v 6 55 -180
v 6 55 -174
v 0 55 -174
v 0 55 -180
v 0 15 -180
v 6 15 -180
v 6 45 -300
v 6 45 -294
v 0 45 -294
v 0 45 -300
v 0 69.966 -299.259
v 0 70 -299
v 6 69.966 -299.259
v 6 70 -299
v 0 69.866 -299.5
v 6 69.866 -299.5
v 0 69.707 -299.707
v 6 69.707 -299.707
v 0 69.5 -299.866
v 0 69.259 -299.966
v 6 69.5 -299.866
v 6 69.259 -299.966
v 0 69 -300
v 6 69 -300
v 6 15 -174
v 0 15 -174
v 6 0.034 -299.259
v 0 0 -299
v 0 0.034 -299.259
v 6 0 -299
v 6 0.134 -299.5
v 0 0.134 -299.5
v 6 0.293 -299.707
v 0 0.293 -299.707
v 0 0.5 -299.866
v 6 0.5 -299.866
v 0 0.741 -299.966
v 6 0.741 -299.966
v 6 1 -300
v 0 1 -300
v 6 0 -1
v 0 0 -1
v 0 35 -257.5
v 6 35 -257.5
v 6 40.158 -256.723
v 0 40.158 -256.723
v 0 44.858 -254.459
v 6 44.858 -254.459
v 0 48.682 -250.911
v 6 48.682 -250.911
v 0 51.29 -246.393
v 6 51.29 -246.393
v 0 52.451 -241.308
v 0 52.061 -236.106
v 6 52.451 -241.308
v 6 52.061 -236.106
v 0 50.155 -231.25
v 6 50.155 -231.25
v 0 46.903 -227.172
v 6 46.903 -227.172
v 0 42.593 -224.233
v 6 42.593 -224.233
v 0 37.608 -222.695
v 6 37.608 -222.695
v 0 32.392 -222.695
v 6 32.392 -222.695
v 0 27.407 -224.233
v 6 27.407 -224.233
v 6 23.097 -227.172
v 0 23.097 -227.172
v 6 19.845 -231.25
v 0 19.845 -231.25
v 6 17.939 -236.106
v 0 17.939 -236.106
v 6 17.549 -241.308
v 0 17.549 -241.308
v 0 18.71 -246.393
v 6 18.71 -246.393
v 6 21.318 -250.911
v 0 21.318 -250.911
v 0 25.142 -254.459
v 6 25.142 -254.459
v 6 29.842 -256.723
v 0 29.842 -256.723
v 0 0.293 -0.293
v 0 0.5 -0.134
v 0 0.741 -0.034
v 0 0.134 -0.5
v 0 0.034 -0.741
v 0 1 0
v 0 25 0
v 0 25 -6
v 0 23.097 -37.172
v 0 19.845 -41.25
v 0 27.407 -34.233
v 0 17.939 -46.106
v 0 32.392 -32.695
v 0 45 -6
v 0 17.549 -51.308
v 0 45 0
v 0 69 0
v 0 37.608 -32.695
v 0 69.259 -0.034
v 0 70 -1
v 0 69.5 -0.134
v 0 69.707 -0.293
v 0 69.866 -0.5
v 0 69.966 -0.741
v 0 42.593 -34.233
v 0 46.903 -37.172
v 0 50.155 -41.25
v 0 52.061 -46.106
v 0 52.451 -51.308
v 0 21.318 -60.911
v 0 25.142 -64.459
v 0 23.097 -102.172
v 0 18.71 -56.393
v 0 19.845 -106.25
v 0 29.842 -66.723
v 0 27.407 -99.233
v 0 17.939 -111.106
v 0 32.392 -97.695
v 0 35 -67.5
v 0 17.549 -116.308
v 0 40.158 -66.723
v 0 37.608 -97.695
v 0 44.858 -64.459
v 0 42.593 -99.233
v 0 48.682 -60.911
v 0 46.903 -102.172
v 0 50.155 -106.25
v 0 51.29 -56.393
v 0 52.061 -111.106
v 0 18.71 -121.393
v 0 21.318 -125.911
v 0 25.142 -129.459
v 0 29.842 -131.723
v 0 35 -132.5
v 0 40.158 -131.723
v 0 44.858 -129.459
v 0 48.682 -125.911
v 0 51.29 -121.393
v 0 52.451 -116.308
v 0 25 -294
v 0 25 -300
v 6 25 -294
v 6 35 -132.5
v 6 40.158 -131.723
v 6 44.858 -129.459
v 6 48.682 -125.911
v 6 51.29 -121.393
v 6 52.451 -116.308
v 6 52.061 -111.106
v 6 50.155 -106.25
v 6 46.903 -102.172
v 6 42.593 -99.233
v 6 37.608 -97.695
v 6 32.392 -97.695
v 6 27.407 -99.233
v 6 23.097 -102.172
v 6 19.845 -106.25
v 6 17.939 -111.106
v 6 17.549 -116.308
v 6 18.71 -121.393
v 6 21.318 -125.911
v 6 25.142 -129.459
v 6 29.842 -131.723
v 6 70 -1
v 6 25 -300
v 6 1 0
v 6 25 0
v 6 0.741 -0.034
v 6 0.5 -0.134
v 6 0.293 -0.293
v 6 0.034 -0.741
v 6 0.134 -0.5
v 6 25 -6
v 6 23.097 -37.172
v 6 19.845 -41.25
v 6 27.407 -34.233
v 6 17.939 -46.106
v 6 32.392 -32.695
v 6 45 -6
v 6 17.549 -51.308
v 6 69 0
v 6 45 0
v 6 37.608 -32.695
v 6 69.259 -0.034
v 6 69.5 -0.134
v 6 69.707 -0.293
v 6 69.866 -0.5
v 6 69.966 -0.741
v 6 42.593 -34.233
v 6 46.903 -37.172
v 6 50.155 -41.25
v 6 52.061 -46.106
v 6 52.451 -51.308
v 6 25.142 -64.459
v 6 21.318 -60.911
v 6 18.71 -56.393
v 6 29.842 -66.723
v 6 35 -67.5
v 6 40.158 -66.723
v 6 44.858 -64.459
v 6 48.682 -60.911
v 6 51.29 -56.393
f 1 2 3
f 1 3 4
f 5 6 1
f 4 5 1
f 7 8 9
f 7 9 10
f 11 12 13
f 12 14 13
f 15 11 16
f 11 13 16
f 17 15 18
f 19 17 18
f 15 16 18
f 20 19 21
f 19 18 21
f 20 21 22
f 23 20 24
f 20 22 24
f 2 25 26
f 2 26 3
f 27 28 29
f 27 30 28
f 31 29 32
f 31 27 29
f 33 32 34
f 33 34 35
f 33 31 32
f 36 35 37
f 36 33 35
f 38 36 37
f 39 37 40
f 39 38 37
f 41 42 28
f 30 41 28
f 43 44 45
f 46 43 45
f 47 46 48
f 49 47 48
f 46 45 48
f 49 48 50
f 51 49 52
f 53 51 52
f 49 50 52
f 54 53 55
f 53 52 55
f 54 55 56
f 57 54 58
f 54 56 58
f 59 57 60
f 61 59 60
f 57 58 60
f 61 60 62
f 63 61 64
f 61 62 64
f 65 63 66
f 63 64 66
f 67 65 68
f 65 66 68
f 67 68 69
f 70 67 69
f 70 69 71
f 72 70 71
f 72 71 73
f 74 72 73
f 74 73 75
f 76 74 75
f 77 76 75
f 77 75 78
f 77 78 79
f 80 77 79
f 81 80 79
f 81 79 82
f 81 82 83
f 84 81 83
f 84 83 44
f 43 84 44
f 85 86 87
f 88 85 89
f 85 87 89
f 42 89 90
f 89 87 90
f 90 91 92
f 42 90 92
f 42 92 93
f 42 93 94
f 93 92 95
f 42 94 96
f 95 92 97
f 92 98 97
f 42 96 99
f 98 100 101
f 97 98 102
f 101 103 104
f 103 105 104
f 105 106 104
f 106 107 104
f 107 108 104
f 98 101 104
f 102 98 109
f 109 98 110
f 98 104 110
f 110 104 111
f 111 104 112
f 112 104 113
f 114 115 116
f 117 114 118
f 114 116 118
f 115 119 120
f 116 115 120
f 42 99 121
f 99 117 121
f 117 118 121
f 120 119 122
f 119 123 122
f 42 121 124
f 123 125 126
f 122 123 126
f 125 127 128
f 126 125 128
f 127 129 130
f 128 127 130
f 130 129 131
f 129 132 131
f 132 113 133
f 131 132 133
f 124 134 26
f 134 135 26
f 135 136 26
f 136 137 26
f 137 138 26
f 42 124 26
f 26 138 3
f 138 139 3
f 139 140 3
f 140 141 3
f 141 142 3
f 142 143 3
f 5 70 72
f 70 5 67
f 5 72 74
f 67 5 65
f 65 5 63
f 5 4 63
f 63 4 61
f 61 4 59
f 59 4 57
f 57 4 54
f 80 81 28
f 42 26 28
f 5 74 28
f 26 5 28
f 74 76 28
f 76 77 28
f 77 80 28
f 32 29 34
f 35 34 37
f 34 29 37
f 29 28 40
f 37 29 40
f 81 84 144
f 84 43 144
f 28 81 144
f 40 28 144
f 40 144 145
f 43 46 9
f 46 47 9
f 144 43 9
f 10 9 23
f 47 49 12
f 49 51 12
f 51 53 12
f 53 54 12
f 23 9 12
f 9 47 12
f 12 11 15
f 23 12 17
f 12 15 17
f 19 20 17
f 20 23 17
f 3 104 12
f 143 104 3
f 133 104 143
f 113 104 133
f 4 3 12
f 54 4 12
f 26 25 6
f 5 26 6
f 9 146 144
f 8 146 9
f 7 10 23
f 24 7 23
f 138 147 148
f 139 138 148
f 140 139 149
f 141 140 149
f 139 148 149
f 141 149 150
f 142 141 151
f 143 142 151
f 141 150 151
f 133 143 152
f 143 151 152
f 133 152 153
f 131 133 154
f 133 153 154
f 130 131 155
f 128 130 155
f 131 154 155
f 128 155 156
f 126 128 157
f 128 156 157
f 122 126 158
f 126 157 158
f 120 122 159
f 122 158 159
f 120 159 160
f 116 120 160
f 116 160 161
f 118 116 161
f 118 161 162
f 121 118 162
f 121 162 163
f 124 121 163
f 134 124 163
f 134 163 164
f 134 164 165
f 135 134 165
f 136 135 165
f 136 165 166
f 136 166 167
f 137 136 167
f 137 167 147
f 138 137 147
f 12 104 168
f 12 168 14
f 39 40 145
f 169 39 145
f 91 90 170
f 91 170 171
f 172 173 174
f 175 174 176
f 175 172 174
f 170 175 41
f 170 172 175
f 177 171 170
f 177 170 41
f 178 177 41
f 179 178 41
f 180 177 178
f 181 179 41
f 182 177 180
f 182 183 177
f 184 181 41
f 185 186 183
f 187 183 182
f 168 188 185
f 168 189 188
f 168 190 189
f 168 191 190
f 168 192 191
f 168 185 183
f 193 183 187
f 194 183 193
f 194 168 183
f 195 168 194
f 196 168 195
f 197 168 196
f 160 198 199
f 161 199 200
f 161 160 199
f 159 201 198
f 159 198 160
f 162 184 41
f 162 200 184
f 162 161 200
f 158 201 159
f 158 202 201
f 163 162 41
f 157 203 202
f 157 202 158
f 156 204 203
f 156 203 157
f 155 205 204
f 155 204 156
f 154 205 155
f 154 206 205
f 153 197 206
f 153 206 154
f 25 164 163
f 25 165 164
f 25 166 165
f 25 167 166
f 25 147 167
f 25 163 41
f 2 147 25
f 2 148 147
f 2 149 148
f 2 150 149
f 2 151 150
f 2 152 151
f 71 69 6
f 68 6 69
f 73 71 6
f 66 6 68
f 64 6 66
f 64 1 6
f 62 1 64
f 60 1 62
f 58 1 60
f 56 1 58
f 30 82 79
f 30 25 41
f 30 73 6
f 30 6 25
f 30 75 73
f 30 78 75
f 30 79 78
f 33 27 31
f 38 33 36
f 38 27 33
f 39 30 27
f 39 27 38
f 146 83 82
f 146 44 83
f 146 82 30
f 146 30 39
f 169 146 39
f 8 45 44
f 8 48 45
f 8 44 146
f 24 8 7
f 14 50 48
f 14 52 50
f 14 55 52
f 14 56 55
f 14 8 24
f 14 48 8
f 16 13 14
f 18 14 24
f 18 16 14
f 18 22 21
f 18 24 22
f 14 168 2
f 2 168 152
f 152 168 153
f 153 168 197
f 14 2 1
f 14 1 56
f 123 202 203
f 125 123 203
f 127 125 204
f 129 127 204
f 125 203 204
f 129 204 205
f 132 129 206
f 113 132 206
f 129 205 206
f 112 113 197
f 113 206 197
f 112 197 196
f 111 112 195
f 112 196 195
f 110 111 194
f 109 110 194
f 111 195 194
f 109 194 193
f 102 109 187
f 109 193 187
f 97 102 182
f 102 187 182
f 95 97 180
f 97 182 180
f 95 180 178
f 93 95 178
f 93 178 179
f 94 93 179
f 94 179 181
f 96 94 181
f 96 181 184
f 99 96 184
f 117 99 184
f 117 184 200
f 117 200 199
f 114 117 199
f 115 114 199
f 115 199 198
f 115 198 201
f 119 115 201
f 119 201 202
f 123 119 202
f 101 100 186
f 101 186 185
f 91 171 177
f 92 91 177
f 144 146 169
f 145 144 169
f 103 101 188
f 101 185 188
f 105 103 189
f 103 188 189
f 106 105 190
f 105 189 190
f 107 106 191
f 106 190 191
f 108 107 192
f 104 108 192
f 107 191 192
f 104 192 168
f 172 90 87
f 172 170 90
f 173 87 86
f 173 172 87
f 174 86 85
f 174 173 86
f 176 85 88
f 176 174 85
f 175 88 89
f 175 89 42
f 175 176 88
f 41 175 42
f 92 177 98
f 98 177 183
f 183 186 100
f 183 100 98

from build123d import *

# Parameters (mm, degrees)
SKETCH1_W   = 300
SKETCH1_H   = 70
WALL_DEPTH  = 6
SKETCH2_W   = 6
SKETCH2_H   = 40
SKETCH2_H_2 = 20
MOUNT_DEPTH = 309.116860947
SKETCH3_R   = 17.5
LITE_DEPTH  = 309.116860947
FILLET_2_R  = 1


with BuildPart() as part:
    # Sketch1 → wall (new body)
    with BuildSketch(Plane(origin=(0, 0, 0), x_dir=(0, 0, -1), z_dir=(1, 0, 0))):
        with Locations((150, 35)):
            Rectangle(SKETCH1_W, SKETCH1_H)
    extrude(amount=WALL_DEPTH)

    # Sketch2 → mount (cut, through all)
    with BuildSketch(Plane(origin=(6, 0, 0), x_dir=(0, 0, -1), z_dir=(1, 0, 0))):
        with Locations((177, 35)):
            Rectangle(SKETCH2_W, SKETCH2_H)
        with Locations((297, 35)):
            Rectangle(SKETCH2_W, SKETCH2_H_2)
        with Locations((3, 35)):
            Rectangle(SKETCH2_W, SKETCH2_H_2)
    extrude(amount=-MOUNT_DEPTH, mode=Mode.SUBTRACT)

    # Sketch3 → lite (cut, through all)
    with BuildSketch(Plane(origin=(6, 0, 0), x_dir=(0, 0, -1), z_dir=(1, 0, 0))):
        with Locations((50, 35)):
            Circle(SKETCH3_R)
        with Locations((115, 35)):
            Circle(SKETCH3_R)
        with Locations((240, 35)):
            Circle(SKETCH3_R)
    extrude(amount=-LITE_DEPTH, mode=Mode.SUBTRACT)

    # fillet 2
    fillet_2_edges = [part.edges().sort_by_distance(p)[0] for p in [
        (3, 70, 0),
        (3, 70, -300),
        (3, 0, -300),
        (3, 0, 0),
    ]]
    fillet(fillet_2_edges, radius=FILLET_2_R)


solid = part.part
